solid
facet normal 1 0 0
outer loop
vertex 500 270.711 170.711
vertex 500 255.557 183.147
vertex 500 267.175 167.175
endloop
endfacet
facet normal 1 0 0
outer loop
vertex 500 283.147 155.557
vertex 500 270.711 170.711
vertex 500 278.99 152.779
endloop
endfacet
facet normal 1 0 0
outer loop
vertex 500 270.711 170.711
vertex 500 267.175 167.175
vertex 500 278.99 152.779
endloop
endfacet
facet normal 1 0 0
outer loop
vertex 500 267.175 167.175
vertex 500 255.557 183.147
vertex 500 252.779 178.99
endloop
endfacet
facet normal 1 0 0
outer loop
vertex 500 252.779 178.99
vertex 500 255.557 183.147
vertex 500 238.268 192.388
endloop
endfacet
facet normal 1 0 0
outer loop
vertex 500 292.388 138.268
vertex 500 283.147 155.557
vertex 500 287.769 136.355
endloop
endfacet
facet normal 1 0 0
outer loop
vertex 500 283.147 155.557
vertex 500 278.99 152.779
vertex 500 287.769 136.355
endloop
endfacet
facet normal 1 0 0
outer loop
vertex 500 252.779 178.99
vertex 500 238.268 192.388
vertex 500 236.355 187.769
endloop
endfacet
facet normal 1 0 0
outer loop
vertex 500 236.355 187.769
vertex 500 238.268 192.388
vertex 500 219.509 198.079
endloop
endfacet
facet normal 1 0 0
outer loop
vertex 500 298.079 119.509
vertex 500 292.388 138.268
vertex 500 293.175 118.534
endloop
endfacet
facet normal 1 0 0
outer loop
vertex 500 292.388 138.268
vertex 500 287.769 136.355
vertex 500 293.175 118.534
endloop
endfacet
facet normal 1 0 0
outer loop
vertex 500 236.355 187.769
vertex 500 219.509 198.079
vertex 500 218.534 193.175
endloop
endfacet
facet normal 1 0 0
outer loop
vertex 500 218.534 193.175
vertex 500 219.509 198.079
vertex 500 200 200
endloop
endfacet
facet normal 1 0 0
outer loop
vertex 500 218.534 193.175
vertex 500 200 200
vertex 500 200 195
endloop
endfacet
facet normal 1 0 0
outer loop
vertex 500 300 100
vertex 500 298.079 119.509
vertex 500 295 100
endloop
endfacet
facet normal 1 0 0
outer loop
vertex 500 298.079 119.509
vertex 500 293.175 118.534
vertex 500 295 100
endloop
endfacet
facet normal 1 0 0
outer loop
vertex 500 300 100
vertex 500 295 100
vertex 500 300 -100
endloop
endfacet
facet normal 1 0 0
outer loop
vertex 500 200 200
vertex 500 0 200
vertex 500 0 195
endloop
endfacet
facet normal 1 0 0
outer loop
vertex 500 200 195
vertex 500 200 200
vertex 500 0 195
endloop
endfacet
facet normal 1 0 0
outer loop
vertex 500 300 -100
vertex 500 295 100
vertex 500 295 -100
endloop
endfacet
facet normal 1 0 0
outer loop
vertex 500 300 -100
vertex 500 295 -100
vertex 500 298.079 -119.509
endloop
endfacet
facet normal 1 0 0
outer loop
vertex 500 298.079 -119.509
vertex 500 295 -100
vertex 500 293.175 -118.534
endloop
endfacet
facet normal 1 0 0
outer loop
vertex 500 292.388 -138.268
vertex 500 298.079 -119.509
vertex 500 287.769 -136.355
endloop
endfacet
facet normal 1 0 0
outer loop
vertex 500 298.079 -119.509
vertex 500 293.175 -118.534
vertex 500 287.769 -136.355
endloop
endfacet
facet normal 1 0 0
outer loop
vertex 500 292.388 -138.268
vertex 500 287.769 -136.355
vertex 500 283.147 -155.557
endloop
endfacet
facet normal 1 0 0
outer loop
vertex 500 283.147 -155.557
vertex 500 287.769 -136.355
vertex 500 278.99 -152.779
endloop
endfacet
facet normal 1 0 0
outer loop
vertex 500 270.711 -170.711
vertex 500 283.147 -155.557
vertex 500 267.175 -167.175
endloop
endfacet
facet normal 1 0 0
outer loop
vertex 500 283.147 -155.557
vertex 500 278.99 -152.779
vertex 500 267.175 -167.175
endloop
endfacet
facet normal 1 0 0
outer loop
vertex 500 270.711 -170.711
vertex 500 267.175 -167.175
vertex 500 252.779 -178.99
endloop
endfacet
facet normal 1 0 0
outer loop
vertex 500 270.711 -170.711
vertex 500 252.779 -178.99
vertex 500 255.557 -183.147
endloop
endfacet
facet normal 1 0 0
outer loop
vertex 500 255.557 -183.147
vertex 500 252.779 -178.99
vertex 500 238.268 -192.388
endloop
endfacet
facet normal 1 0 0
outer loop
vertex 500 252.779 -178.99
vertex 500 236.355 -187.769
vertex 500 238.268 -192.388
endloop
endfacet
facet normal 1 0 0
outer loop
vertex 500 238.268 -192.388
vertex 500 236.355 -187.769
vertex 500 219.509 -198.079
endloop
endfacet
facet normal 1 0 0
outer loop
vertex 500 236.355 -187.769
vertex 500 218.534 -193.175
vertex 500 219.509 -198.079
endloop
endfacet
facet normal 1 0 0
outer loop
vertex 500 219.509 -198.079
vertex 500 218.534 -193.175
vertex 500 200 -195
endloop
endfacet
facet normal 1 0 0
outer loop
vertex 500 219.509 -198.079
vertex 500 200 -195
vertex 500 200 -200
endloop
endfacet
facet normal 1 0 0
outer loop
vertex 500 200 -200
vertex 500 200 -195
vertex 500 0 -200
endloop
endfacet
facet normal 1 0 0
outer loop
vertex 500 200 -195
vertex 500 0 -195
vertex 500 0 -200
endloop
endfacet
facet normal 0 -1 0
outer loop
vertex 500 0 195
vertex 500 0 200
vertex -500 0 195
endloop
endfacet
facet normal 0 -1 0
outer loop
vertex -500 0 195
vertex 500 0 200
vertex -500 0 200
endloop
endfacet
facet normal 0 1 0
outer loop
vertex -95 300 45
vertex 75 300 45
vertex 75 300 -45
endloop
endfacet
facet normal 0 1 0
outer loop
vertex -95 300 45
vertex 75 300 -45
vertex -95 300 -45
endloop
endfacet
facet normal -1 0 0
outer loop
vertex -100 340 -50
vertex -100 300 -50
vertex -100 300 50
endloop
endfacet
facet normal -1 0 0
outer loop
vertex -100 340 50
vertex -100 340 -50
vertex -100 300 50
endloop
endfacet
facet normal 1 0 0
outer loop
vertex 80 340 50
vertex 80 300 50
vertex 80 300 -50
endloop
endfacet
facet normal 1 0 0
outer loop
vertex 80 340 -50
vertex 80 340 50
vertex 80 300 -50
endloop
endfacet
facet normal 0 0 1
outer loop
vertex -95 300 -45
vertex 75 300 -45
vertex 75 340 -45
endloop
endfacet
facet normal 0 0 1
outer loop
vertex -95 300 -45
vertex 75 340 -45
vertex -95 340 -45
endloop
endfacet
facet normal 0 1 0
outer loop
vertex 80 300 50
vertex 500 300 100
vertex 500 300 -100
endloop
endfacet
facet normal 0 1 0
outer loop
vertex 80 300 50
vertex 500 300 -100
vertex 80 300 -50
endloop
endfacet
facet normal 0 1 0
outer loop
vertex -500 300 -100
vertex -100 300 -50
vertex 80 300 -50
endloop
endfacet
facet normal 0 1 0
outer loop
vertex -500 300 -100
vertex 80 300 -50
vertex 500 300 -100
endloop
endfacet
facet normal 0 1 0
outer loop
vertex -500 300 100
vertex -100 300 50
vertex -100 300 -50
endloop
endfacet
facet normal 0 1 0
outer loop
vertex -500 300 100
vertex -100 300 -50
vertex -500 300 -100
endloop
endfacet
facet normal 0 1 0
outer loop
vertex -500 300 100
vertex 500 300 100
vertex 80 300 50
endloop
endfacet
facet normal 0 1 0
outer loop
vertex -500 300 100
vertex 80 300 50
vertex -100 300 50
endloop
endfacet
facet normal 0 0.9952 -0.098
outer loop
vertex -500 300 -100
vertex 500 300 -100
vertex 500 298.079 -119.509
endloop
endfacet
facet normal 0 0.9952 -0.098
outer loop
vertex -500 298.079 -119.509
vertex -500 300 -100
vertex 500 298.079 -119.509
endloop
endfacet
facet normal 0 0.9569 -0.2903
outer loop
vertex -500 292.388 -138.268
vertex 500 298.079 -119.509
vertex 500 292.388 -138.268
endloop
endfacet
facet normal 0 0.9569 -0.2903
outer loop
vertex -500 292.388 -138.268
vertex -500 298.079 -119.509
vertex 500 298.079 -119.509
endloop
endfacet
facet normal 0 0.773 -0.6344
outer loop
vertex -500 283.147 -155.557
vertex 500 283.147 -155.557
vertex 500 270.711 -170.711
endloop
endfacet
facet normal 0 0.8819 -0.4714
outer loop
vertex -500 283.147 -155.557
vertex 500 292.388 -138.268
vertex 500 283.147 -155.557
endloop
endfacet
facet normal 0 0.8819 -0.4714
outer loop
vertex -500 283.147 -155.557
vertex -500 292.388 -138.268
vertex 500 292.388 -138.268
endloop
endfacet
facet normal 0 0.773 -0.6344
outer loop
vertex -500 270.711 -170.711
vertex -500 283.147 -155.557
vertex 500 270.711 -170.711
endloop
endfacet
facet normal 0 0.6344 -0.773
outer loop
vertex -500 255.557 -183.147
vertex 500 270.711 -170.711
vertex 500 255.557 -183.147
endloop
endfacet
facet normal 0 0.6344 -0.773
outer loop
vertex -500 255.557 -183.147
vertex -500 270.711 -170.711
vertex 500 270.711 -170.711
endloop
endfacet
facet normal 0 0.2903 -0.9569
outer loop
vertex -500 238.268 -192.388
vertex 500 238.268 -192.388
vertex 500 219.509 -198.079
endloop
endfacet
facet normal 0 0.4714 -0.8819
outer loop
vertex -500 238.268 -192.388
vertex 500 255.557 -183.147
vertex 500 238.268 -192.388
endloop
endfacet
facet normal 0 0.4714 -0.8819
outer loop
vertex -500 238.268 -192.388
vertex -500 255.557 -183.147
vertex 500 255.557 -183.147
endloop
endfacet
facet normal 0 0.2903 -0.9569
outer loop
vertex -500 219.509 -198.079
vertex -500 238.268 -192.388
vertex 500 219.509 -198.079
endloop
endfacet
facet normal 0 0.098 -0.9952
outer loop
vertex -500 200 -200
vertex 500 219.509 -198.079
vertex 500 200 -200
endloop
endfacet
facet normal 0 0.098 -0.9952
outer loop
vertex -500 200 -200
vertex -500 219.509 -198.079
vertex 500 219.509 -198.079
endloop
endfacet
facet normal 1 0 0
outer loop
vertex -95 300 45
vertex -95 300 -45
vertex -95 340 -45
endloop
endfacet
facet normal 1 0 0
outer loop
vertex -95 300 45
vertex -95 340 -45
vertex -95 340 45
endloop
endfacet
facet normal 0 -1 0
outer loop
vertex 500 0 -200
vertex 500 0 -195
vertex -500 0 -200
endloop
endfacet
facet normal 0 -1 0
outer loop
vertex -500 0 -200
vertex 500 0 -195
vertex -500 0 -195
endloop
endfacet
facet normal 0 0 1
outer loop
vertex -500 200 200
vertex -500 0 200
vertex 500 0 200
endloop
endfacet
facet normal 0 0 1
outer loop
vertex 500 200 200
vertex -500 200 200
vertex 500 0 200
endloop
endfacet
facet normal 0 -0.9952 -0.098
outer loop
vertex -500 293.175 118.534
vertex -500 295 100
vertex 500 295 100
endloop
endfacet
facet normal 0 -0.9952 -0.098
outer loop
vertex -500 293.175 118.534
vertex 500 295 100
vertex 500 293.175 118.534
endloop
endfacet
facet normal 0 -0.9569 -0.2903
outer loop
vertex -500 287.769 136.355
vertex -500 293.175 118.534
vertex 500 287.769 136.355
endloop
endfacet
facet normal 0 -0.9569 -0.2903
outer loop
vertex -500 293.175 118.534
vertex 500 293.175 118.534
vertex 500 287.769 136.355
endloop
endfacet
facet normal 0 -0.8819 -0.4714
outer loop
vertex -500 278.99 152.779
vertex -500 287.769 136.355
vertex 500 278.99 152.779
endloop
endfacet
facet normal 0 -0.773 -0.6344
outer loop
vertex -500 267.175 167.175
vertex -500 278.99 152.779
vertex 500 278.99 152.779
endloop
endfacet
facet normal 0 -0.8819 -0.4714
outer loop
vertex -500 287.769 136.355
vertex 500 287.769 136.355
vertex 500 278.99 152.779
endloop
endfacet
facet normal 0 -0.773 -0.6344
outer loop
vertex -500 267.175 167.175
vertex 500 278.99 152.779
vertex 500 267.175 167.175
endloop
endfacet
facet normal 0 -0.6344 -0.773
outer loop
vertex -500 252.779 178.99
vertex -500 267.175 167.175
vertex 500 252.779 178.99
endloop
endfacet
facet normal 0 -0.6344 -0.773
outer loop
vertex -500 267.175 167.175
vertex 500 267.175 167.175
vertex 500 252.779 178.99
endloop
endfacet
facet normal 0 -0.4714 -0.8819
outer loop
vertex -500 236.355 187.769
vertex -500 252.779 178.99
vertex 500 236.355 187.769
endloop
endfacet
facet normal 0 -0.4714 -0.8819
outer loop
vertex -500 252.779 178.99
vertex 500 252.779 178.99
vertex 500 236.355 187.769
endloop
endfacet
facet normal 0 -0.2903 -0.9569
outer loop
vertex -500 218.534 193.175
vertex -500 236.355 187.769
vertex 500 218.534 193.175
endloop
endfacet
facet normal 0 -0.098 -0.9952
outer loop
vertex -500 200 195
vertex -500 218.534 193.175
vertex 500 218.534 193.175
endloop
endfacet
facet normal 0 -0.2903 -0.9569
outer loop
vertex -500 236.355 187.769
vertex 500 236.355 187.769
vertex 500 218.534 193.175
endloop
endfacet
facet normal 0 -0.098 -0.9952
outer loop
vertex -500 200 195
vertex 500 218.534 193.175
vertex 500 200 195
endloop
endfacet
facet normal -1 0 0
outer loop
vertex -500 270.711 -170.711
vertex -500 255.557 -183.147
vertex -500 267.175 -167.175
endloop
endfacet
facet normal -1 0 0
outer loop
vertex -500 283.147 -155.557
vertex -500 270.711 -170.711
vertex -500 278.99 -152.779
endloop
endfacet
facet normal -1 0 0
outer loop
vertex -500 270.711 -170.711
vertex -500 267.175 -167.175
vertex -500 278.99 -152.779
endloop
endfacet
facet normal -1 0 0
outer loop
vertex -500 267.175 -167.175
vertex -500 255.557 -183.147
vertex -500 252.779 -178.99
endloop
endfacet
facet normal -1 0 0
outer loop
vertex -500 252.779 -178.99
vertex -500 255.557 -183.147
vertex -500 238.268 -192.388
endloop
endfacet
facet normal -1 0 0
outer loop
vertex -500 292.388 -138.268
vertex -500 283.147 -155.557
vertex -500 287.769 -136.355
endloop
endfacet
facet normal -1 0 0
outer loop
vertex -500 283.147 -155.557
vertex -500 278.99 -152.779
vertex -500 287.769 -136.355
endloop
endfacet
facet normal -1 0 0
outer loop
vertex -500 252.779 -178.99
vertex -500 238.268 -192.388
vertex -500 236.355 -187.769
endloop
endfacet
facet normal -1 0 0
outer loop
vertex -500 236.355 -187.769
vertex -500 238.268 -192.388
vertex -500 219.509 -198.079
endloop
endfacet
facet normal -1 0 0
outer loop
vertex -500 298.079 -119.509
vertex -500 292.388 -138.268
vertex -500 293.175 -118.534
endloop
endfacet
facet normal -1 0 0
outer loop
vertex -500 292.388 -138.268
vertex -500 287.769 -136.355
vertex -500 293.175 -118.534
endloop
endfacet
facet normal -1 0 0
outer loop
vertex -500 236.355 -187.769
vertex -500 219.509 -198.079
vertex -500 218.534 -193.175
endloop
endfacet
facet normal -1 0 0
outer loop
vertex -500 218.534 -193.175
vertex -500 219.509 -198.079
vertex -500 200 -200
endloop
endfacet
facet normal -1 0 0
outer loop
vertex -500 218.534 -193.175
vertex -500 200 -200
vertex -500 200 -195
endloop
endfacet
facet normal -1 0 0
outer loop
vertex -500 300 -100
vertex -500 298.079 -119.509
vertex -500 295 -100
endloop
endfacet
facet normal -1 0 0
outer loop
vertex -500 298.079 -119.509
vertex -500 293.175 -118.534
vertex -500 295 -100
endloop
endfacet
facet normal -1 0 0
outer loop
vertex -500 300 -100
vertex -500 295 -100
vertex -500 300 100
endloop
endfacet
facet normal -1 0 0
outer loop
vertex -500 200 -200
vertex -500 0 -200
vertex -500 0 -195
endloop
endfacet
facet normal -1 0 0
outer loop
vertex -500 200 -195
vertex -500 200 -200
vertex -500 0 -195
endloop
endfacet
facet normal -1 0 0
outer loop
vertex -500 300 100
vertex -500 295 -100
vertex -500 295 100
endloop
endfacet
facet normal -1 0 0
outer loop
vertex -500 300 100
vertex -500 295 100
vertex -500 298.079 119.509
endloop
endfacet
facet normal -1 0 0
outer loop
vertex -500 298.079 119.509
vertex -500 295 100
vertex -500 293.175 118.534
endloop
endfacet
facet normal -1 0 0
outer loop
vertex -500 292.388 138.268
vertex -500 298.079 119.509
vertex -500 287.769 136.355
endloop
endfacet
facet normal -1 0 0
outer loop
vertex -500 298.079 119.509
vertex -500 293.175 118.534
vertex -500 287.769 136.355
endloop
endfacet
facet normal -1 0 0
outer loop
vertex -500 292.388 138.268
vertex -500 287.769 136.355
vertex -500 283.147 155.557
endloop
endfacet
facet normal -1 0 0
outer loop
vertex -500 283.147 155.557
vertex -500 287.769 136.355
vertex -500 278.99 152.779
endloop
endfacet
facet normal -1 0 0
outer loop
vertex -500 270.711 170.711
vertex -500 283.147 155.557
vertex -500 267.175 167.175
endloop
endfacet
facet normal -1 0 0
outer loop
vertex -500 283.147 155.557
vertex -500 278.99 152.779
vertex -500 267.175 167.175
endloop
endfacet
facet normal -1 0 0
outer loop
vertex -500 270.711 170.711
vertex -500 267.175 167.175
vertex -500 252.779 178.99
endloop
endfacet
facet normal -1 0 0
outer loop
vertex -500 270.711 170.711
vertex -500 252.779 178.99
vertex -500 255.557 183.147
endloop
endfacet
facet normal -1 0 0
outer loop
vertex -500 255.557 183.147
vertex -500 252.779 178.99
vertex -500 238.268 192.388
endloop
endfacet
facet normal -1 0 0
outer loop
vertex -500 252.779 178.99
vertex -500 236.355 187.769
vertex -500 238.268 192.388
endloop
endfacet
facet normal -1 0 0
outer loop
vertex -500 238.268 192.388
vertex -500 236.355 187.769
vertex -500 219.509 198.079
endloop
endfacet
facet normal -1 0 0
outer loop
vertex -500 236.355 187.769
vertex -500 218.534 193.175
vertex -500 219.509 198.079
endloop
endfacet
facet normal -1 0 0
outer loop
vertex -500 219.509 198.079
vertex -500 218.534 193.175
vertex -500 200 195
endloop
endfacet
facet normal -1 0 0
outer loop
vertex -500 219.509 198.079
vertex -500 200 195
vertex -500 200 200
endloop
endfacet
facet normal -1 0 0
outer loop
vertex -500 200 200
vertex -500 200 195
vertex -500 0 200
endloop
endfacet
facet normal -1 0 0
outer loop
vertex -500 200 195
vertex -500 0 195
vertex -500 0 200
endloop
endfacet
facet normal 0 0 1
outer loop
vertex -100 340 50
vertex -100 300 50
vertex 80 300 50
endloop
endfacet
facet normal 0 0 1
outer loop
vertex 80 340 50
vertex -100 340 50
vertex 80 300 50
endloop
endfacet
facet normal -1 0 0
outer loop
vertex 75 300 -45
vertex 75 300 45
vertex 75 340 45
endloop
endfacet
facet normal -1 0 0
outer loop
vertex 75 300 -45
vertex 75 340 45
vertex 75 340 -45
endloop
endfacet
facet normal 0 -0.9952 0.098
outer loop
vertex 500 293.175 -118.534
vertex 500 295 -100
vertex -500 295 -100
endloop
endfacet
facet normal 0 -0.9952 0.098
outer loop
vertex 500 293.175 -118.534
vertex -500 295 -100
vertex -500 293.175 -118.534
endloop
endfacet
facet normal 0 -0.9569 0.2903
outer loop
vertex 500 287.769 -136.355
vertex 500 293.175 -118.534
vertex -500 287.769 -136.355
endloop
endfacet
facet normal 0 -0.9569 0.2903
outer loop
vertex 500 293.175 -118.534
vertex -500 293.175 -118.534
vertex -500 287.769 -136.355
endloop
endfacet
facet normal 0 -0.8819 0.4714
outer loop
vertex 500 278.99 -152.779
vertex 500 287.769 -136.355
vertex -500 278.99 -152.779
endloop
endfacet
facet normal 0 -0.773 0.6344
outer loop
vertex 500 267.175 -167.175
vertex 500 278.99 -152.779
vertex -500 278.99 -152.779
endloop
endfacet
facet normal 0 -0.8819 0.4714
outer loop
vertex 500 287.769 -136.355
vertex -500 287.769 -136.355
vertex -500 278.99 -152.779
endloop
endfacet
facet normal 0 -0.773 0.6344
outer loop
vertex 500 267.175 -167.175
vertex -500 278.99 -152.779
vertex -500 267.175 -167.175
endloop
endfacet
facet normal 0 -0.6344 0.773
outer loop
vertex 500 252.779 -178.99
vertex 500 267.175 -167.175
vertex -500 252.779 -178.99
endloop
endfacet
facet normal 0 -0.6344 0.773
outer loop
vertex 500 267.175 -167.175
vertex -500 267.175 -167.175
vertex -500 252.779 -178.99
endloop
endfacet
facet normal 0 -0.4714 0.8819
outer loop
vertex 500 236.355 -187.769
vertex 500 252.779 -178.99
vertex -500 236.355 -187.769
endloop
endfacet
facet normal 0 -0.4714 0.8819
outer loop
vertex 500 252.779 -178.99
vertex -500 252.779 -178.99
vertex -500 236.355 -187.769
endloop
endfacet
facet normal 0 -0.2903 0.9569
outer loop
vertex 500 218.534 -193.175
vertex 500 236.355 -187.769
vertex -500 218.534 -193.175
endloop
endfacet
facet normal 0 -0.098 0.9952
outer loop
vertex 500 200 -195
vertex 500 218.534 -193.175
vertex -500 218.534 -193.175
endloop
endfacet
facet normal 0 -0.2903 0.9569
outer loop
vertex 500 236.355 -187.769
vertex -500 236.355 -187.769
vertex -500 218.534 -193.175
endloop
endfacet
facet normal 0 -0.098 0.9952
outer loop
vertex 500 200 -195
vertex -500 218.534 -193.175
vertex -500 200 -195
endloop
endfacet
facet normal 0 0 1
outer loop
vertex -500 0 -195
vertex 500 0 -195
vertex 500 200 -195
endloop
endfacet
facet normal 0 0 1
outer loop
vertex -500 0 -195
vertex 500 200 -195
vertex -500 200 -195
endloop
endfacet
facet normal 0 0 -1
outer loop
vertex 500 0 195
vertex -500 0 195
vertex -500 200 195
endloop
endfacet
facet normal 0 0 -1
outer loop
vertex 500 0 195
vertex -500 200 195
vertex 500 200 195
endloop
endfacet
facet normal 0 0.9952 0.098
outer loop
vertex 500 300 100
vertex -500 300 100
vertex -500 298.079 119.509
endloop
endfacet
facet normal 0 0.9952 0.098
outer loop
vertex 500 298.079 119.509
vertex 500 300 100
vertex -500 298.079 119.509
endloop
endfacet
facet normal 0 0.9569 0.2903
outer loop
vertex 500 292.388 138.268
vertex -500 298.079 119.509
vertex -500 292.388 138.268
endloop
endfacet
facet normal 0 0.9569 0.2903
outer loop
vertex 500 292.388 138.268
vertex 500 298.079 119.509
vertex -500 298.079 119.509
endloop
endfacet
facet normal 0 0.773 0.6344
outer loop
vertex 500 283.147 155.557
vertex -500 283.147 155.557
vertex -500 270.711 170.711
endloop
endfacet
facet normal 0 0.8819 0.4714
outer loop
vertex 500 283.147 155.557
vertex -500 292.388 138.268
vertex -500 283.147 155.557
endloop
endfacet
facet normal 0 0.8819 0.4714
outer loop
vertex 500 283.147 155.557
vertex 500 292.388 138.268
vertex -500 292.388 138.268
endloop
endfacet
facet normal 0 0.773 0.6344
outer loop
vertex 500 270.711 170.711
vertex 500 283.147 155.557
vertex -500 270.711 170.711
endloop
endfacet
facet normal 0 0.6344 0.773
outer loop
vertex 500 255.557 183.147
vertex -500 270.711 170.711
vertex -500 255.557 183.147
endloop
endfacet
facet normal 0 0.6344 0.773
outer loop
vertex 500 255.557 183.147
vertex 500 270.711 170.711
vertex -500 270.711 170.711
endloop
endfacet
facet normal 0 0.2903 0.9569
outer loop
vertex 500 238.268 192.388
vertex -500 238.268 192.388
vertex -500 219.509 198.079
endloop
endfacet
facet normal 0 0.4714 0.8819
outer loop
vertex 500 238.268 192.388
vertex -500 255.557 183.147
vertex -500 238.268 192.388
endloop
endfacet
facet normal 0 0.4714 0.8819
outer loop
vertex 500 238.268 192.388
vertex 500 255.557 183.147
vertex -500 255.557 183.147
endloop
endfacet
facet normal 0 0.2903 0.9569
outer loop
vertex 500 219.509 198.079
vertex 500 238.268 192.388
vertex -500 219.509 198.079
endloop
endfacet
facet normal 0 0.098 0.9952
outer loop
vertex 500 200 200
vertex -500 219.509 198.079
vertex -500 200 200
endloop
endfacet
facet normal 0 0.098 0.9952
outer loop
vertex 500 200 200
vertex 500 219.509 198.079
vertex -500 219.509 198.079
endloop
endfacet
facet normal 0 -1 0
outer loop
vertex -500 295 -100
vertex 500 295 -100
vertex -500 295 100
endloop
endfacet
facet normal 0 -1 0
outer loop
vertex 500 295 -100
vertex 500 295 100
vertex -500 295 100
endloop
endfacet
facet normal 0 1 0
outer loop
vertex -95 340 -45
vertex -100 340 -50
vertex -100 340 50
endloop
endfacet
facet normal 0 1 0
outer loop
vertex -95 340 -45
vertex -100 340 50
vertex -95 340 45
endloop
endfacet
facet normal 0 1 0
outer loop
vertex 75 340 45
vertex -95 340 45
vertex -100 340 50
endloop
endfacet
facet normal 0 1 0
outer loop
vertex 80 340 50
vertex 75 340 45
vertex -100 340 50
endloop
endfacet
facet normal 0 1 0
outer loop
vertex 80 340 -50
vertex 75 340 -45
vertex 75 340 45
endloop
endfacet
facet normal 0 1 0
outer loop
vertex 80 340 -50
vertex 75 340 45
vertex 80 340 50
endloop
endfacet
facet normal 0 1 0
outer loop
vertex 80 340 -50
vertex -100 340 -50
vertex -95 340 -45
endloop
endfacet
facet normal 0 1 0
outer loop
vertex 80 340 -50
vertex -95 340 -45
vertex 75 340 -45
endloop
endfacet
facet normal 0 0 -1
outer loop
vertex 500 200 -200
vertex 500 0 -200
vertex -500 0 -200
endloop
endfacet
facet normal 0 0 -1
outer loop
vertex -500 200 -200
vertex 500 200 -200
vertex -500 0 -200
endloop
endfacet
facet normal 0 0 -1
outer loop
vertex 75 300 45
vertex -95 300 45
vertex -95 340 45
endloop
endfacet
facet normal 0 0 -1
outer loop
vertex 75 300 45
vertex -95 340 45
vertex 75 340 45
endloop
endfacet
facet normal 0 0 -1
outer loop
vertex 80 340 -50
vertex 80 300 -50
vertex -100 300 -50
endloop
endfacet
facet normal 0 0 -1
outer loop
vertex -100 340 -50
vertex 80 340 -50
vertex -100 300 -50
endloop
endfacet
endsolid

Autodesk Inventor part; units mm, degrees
ref_plane "YZ Plane" through (0, 0, 0) normal (1, 0, 0) x (0, 1, 0)
ref_plane "XZ Plane" through (0, 0, 0) normal (0, 1, 0) x (-1, 0, 0)
ref_plane "XY Plane" through (0, 0, 0) normal (0, 0, 1) x (1, 0, 0)
sketch "Sketch1" plane through (0, 0, 0) normal (0, 1, 0) x (-1, 0, 0)
  line L0 (500, 200) -> (-500, 200)
  line L1 (-500, 200) -> (-500, -200)
  line L2 (-500, -200) -> (500, -200)
  line L3 (500, -200) -> (500, 200)
  line L4 (500, 200) -> (-500, -200) construction
  line L5 (-500, 200) -> (500, -200) construction
  point P0 (0, 0)
  dimension "d0" = 1000
  dimension "d1" = 400
extrude "Extrusion1" add sketch "Sketch1" along normal blind 300
fillet "Fillet1" radius 100 2 edges at (0, 300, 200) (0, 300, -200)
shell "Shell1" thickness 5 removed faces 3 at (-500, 100, -33.3333) at (166.6667, 0, 66.6667) at (500, 100, 33.3333)
sketch "Sketch2" plane through (0, 300, 0) normal (0, 1, 0) x (1, 0, 0)
  line L0 (-100, -50) -> (80, -50)
  line L1 (80, -50) -> (80, 50)
  line L2 (80, 50) -> (-100, 50)
  line L3 (-100, 50) -> (-100, -50)
  line L4 (-500, 100) -> (-500, -100) projected
  line L5 (500, -100) -> (-500, -100) projected
  point P0 (0, 0)
  dimension "d6" = 180
  dimension "d7" = 100
  dimension "d8" = 400
  dimension "d9" = 50
extrude "Extrusion2" add sketch "Sketch2" along normal blind 40
shell "Shell2" thickness 5 removed faces 1 at (-40, 340, 16.6667)
properties part number "GEAR PANEL"
